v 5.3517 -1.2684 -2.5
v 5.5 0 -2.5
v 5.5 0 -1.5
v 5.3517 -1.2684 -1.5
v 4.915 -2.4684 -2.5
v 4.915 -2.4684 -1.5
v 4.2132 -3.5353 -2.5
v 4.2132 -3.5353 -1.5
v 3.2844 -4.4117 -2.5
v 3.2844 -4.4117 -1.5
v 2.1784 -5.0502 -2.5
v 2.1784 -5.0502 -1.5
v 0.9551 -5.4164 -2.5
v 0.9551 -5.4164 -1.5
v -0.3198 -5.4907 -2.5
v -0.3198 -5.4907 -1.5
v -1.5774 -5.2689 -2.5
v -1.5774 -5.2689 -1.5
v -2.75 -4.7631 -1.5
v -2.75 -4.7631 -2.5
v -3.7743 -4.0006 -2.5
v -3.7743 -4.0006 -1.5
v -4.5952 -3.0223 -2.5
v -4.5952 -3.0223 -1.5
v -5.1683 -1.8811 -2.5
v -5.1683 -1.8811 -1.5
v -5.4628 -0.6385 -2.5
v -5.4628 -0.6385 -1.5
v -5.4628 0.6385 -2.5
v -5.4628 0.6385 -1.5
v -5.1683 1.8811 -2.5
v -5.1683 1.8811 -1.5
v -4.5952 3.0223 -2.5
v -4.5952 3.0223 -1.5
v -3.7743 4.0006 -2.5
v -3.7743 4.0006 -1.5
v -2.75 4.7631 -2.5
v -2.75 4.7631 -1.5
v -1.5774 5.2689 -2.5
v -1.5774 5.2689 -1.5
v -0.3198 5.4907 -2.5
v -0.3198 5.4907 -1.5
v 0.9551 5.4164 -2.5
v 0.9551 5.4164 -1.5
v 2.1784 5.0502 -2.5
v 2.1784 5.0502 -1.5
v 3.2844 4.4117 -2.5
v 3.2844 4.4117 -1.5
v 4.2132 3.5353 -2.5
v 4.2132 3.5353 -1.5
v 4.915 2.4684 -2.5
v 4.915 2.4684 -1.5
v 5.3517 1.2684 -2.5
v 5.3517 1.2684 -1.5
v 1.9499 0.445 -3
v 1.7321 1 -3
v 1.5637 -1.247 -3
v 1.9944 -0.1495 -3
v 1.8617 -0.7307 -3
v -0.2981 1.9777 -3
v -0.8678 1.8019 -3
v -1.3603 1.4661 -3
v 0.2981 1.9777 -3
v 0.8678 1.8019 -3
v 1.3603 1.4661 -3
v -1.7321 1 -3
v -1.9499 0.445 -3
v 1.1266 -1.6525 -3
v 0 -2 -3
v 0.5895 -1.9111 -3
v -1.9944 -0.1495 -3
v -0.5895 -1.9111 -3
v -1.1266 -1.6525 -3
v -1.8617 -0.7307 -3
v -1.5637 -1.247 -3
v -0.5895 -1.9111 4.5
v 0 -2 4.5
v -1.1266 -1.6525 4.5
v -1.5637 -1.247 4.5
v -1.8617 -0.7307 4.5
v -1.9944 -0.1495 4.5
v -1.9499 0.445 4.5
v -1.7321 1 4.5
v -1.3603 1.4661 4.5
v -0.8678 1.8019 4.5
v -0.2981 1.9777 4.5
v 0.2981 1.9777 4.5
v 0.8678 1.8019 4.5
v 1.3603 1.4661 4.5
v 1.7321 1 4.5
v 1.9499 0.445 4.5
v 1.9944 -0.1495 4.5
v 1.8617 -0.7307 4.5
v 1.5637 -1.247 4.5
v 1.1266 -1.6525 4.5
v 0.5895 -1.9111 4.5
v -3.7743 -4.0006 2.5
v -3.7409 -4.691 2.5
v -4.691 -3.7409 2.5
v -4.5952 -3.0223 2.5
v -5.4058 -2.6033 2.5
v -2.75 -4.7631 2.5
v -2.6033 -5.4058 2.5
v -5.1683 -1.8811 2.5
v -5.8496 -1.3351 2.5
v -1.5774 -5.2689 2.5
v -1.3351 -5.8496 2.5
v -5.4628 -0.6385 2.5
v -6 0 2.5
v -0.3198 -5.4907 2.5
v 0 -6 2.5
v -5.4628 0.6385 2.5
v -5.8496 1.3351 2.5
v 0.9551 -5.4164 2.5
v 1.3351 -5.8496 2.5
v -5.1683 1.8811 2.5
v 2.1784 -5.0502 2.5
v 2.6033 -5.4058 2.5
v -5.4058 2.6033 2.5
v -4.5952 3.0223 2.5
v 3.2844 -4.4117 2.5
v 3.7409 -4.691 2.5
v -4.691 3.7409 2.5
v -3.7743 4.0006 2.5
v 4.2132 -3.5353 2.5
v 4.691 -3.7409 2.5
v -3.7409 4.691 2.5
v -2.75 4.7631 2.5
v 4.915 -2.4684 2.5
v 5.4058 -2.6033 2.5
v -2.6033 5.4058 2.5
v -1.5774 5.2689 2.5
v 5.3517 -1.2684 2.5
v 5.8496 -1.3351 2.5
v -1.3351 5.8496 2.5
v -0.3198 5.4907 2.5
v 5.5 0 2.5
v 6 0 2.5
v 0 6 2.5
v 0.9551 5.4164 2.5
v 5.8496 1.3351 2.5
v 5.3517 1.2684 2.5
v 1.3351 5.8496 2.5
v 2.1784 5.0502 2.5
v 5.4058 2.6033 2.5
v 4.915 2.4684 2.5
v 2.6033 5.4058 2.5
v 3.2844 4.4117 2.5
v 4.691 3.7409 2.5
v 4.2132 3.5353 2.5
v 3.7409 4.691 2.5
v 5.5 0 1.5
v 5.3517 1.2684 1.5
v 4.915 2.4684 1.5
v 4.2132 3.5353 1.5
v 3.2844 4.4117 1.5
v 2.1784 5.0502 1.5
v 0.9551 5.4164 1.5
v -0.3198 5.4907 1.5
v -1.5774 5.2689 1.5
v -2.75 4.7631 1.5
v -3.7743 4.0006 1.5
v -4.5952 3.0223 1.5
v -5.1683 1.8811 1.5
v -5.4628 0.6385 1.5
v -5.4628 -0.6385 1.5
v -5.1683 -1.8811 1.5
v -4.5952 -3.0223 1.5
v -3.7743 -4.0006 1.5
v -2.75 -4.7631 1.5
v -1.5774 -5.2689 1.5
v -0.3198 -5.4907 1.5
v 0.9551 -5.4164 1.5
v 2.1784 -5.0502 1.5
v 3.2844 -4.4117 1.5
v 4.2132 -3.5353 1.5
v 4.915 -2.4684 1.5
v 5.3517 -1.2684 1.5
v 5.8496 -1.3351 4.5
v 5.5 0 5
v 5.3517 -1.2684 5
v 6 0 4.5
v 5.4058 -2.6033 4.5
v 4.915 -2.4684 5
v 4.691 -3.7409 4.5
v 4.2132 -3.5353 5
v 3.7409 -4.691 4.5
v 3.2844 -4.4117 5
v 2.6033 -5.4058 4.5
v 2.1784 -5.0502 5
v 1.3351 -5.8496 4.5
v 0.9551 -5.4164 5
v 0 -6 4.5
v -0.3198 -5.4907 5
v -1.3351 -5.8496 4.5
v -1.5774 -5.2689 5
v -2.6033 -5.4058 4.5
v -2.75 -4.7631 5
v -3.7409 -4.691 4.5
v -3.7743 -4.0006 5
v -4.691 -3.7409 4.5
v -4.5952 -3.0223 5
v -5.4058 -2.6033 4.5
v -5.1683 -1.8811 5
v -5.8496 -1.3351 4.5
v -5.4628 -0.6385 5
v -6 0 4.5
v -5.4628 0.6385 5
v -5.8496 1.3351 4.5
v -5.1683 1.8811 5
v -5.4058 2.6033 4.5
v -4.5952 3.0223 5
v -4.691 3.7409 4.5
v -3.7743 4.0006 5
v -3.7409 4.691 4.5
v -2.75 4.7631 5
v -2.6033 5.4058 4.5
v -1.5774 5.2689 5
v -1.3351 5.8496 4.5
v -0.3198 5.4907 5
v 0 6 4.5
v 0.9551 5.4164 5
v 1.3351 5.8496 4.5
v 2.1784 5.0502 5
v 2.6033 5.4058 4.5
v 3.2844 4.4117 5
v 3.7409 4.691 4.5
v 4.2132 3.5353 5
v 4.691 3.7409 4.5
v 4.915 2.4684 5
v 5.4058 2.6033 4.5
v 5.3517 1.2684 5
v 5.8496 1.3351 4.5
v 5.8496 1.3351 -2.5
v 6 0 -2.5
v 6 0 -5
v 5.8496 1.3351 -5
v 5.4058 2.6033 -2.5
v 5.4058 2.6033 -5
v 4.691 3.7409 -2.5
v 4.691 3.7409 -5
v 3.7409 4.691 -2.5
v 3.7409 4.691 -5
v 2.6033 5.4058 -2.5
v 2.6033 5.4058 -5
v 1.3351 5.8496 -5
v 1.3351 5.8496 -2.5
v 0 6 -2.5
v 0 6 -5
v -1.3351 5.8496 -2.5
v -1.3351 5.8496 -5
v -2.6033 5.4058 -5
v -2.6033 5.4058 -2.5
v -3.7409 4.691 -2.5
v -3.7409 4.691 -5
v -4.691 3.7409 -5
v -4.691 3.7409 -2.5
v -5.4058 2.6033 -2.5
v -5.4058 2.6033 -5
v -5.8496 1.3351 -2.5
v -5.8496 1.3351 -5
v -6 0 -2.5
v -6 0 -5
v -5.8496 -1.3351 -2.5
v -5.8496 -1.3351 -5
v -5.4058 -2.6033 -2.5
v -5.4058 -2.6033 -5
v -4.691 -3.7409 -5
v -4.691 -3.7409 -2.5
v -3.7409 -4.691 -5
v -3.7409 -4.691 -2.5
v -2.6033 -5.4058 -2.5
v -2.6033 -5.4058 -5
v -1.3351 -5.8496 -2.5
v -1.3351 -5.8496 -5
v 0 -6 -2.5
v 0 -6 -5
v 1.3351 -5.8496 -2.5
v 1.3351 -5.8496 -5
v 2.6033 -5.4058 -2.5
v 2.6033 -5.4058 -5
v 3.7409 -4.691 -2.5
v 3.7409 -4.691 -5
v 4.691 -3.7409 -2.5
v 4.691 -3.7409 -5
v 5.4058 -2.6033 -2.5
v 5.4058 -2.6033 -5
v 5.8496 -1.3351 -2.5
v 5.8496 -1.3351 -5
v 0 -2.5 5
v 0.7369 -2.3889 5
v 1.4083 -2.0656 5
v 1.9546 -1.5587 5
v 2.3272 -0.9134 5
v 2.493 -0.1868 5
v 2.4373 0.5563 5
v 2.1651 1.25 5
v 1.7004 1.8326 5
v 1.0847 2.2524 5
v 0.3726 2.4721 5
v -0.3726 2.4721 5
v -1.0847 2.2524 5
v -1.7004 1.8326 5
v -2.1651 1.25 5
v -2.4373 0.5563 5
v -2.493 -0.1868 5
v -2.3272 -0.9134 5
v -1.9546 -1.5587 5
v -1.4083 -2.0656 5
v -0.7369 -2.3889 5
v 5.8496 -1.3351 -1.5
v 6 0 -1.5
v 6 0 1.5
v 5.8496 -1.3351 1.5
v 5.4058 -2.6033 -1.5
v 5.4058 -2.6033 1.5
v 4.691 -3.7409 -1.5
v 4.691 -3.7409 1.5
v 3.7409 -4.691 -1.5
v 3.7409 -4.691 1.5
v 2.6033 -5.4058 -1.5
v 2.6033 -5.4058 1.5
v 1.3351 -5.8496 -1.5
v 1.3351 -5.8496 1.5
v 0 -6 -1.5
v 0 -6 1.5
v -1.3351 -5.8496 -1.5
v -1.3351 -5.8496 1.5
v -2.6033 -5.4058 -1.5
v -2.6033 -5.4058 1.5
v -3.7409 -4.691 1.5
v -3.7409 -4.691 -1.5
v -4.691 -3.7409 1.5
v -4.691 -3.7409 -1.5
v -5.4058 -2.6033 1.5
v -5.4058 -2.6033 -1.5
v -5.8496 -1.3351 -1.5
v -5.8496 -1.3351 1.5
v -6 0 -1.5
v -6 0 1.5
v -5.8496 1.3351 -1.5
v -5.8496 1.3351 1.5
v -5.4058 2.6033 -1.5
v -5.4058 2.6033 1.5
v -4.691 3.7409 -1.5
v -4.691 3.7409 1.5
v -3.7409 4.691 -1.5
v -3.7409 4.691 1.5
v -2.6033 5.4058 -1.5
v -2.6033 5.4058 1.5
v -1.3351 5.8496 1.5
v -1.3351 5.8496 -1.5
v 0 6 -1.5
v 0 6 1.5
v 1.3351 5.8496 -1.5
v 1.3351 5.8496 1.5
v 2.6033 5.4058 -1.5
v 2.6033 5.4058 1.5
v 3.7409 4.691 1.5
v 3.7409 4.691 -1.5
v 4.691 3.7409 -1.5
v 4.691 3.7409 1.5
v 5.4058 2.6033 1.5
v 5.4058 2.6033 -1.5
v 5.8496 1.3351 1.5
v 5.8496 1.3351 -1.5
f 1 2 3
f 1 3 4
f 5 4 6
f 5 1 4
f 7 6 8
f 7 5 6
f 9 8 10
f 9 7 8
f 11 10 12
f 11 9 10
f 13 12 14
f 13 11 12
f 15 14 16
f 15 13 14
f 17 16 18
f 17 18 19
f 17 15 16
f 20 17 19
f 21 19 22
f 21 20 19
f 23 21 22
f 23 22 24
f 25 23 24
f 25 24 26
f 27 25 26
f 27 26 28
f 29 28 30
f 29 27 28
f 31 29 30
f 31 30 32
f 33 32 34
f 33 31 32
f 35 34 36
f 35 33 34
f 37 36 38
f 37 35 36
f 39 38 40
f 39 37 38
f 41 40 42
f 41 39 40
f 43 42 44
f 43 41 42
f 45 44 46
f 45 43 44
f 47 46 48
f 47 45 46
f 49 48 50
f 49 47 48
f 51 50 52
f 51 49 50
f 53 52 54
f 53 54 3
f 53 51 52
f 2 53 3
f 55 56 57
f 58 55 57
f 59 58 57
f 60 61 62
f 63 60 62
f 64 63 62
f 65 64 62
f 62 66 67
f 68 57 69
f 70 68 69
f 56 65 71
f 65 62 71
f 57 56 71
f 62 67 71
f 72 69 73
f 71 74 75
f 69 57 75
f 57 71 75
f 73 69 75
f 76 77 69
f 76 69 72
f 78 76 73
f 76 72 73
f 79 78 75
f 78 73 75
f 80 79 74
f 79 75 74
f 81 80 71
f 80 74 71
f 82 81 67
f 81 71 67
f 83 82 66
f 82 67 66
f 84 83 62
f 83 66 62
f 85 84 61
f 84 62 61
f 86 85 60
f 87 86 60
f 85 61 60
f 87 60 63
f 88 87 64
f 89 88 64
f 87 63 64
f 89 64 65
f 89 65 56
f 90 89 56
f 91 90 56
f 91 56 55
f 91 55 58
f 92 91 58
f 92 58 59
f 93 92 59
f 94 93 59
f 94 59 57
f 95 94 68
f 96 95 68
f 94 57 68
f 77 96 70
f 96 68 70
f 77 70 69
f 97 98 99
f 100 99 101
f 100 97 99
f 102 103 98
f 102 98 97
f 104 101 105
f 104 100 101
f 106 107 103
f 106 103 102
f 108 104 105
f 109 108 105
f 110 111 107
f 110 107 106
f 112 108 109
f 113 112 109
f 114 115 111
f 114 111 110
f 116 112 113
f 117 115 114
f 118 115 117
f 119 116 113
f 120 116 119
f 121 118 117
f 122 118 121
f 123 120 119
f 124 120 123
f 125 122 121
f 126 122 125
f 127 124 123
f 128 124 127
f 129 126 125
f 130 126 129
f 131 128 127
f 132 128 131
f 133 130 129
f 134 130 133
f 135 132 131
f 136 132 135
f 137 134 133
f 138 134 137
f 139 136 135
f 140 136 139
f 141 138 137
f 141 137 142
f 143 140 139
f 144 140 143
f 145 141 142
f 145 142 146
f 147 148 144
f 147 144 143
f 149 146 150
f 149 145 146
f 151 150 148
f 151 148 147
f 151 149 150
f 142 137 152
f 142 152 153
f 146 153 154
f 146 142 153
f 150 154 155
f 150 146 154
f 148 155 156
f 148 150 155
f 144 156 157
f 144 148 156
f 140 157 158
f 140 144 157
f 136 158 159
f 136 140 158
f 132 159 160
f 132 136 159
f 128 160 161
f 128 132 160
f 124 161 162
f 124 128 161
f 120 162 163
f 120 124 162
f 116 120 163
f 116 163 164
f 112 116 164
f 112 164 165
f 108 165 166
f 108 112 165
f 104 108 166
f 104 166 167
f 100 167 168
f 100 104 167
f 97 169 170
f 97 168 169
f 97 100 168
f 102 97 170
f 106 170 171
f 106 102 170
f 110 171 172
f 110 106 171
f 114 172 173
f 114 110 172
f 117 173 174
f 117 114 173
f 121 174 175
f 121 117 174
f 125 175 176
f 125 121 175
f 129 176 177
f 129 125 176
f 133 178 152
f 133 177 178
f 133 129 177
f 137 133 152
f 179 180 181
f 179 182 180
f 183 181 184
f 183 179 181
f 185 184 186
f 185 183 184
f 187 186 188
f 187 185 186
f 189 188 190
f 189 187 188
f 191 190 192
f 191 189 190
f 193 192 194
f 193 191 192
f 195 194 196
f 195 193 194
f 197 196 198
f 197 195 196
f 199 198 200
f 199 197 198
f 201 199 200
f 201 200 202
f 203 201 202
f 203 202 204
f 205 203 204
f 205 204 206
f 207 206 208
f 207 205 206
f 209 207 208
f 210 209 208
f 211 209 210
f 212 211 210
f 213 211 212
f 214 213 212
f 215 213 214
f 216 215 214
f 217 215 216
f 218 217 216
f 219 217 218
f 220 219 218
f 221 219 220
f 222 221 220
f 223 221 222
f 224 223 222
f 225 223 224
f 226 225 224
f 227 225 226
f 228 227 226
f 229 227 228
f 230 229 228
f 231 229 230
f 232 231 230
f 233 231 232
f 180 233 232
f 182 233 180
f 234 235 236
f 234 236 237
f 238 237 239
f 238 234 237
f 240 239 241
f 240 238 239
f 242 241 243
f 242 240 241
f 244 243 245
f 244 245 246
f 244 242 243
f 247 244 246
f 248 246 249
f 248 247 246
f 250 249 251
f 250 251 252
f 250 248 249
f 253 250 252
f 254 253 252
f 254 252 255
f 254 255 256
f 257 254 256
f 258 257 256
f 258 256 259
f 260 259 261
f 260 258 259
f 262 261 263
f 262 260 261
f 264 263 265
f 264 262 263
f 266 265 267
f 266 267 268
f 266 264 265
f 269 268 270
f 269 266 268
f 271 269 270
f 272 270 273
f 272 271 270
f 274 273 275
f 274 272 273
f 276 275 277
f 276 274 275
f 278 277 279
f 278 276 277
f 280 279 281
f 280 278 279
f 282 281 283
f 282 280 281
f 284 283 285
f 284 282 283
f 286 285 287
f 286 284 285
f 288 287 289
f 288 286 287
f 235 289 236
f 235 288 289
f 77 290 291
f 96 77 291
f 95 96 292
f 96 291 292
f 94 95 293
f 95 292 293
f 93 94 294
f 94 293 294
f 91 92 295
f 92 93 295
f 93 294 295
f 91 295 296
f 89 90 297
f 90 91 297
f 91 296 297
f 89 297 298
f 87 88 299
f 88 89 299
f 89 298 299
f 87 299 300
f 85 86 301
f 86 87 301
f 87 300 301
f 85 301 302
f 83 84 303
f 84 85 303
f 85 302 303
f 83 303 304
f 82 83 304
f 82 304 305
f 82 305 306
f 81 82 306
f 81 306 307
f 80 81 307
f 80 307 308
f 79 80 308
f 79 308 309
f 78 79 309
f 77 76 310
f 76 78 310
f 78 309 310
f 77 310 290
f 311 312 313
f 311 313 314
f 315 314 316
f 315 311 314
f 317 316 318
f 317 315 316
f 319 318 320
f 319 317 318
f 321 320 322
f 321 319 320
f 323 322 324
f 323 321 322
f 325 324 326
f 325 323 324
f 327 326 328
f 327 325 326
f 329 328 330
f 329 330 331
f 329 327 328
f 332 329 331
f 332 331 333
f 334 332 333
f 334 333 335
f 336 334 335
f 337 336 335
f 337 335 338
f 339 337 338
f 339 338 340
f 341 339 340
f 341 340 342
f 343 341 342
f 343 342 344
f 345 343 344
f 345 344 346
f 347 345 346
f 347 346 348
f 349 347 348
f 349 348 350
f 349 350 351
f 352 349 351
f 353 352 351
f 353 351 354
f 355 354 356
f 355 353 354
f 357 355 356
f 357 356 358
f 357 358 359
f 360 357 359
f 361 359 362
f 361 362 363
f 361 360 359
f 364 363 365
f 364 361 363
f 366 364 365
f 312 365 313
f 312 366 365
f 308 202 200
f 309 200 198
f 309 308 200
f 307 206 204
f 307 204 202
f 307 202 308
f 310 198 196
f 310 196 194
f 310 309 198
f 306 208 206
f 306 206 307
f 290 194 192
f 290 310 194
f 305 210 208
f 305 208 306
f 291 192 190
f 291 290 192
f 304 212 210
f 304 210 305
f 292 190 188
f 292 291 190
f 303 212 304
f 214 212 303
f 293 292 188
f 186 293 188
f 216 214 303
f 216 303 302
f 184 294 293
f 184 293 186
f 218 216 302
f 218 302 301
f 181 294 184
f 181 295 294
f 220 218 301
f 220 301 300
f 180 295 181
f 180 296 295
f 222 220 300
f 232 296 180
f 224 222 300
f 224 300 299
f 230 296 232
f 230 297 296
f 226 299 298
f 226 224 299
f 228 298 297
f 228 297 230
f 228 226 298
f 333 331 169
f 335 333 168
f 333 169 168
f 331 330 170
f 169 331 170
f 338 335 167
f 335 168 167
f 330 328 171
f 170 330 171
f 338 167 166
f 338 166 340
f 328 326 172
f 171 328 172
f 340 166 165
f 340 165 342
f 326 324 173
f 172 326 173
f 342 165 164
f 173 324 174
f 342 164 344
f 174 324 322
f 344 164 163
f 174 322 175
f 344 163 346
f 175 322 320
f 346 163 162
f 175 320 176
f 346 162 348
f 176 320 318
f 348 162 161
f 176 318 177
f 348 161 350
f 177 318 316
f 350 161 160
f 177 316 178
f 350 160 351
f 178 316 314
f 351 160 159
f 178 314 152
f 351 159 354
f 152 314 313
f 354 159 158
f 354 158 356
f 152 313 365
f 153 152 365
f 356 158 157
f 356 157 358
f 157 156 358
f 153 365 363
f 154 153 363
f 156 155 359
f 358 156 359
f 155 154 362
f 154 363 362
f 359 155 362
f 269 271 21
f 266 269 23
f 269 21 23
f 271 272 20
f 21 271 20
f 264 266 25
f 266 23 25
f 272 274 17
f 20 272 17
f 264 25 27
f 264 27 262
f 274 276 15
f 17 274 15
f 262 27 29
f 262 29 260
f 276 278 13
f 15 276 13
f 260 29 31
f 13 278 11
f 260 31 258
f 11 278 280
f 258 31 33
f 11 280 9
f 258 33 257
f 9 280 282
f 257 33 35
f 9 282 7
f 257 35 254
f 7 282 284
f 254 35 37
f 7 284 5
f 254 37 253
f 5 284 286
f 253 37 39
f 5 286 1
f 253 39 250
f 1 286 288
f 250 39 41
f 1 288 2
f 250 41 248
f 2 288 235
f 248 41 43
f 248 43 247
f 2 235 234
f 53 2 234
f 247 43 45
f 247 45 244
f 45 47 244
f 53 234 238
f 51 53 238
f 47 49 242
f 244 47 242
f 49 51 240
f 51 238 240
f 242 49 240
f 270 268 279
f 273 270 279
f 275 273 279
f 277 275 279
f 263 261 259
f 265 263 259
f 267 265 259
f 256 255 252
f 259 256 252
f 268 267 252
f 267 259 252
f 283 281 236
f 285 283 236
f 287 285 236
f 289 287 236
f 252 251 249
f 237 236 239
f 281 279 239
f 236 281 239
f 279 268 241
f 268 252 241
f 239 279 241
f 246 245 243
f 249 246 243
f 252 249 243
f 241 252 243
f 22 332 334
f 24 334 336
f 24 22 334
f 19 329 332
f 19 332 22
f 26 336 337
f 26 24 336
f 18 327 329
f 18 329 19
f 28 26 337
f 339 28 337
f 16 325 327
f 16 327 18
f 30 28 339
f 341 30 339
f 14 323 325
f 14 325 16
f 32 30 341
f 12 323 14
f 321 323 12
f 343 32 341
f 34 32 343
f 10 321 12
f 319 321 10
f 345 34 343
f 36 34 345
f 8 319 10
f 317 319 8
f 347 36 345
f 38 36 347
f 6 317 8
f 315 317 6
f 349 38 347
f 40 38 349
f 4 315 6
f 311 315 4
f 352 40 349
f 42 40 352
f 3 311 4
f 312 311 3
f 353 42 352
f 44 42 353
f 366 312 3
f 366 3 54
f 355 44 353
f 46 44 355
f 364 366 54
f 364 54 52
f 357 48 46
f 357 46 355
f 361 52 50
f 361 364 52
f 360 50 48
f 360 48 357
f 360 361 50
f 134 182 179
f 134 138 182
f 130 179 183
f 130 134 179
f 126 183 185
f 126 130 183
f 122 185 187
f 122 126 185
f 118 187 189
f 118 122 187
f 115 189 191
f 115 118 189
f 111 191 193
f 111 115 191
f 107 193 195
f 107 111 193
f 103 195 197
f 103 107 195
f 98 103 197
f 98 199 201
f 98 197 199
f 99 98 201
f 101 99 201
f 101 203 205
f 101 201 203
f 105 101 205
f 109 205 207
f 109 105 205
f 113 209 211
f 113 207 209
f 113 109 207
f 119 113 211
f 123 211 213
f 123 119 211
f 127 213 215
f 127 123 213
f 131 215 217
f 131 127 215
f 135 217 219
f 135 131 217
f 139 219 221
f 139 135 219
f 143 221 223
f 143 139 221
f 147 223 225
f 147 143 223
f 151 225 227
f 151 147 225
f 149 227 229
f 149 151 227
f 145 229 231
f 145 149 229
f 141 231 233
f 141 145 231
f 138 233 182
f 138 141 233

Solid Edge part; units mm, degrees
sketch "Sketch1" plane through (0, 0, 0) normal (0, 0, 1) x (1, 0, 0)
  circle A0 centre (0, 0) radius 6
extrude "Protrusion1" add sketch "Sketch1" along normal mid plane 10
sketch "Sketch2" plane through (0, 0, 0) normal (1, 0, 0) x (0, 1, 0)
  line L0 (5.5, 1.5) -> (6, 1.5)
  line L1 (6, 2.5) -> (6, 1.5)
  line L2 (6, 2.5) -> (5.5, 2.5)
revolve "RevolvedCutout1" cut sketch "Sketch2" angle 360 about axis through (0, 0, 6.6251) along (0, 0, -1) material side at (0, 5.75, 1.55)
sketch "Sketch3" plane through (0, 0, 2.5) normal (0, 0, -1) x (1, 0, 0)
  circle A0 centre (0, 0) radius 5.5
extrude "ExtrudedProtrusion_2" add sketch "Sketch3" along normal blind 1
sketch "Sketch4" plane through (0, 0, 0) normal (1, 0, 0) x (0, 1, 0)
  line L0 (6, -2.5) -> (5.5, -2.5)
  line L1 (6, -1.5) -> (6, -2.5)
  line L2 (5.5, -1.5) -> (6, -1.5)
revolve "RevolvedCutout2" cut sketch "Sketch4" angle 360 about axis through (0, 0, 6.6251) along (0, 0, -1) material side at (0, 5.75, -2.45)
mirror "Mirror1" about plane through (0, 0, 0) normal (0, 0, 1) of "ExtrudedProtrusion_2"
chamfer "Chamfer_1" distance 0.5 angle 45 1 edges at (-6, 0, 5)
hole "Hole_1" at (0, 0, 5) direction (0, 0, -1) diameter 4 depth 8 countersink diameter 5 countersink angle 90
cosmetic_thread "Thread_1" size "M4" thread depth 7.5
